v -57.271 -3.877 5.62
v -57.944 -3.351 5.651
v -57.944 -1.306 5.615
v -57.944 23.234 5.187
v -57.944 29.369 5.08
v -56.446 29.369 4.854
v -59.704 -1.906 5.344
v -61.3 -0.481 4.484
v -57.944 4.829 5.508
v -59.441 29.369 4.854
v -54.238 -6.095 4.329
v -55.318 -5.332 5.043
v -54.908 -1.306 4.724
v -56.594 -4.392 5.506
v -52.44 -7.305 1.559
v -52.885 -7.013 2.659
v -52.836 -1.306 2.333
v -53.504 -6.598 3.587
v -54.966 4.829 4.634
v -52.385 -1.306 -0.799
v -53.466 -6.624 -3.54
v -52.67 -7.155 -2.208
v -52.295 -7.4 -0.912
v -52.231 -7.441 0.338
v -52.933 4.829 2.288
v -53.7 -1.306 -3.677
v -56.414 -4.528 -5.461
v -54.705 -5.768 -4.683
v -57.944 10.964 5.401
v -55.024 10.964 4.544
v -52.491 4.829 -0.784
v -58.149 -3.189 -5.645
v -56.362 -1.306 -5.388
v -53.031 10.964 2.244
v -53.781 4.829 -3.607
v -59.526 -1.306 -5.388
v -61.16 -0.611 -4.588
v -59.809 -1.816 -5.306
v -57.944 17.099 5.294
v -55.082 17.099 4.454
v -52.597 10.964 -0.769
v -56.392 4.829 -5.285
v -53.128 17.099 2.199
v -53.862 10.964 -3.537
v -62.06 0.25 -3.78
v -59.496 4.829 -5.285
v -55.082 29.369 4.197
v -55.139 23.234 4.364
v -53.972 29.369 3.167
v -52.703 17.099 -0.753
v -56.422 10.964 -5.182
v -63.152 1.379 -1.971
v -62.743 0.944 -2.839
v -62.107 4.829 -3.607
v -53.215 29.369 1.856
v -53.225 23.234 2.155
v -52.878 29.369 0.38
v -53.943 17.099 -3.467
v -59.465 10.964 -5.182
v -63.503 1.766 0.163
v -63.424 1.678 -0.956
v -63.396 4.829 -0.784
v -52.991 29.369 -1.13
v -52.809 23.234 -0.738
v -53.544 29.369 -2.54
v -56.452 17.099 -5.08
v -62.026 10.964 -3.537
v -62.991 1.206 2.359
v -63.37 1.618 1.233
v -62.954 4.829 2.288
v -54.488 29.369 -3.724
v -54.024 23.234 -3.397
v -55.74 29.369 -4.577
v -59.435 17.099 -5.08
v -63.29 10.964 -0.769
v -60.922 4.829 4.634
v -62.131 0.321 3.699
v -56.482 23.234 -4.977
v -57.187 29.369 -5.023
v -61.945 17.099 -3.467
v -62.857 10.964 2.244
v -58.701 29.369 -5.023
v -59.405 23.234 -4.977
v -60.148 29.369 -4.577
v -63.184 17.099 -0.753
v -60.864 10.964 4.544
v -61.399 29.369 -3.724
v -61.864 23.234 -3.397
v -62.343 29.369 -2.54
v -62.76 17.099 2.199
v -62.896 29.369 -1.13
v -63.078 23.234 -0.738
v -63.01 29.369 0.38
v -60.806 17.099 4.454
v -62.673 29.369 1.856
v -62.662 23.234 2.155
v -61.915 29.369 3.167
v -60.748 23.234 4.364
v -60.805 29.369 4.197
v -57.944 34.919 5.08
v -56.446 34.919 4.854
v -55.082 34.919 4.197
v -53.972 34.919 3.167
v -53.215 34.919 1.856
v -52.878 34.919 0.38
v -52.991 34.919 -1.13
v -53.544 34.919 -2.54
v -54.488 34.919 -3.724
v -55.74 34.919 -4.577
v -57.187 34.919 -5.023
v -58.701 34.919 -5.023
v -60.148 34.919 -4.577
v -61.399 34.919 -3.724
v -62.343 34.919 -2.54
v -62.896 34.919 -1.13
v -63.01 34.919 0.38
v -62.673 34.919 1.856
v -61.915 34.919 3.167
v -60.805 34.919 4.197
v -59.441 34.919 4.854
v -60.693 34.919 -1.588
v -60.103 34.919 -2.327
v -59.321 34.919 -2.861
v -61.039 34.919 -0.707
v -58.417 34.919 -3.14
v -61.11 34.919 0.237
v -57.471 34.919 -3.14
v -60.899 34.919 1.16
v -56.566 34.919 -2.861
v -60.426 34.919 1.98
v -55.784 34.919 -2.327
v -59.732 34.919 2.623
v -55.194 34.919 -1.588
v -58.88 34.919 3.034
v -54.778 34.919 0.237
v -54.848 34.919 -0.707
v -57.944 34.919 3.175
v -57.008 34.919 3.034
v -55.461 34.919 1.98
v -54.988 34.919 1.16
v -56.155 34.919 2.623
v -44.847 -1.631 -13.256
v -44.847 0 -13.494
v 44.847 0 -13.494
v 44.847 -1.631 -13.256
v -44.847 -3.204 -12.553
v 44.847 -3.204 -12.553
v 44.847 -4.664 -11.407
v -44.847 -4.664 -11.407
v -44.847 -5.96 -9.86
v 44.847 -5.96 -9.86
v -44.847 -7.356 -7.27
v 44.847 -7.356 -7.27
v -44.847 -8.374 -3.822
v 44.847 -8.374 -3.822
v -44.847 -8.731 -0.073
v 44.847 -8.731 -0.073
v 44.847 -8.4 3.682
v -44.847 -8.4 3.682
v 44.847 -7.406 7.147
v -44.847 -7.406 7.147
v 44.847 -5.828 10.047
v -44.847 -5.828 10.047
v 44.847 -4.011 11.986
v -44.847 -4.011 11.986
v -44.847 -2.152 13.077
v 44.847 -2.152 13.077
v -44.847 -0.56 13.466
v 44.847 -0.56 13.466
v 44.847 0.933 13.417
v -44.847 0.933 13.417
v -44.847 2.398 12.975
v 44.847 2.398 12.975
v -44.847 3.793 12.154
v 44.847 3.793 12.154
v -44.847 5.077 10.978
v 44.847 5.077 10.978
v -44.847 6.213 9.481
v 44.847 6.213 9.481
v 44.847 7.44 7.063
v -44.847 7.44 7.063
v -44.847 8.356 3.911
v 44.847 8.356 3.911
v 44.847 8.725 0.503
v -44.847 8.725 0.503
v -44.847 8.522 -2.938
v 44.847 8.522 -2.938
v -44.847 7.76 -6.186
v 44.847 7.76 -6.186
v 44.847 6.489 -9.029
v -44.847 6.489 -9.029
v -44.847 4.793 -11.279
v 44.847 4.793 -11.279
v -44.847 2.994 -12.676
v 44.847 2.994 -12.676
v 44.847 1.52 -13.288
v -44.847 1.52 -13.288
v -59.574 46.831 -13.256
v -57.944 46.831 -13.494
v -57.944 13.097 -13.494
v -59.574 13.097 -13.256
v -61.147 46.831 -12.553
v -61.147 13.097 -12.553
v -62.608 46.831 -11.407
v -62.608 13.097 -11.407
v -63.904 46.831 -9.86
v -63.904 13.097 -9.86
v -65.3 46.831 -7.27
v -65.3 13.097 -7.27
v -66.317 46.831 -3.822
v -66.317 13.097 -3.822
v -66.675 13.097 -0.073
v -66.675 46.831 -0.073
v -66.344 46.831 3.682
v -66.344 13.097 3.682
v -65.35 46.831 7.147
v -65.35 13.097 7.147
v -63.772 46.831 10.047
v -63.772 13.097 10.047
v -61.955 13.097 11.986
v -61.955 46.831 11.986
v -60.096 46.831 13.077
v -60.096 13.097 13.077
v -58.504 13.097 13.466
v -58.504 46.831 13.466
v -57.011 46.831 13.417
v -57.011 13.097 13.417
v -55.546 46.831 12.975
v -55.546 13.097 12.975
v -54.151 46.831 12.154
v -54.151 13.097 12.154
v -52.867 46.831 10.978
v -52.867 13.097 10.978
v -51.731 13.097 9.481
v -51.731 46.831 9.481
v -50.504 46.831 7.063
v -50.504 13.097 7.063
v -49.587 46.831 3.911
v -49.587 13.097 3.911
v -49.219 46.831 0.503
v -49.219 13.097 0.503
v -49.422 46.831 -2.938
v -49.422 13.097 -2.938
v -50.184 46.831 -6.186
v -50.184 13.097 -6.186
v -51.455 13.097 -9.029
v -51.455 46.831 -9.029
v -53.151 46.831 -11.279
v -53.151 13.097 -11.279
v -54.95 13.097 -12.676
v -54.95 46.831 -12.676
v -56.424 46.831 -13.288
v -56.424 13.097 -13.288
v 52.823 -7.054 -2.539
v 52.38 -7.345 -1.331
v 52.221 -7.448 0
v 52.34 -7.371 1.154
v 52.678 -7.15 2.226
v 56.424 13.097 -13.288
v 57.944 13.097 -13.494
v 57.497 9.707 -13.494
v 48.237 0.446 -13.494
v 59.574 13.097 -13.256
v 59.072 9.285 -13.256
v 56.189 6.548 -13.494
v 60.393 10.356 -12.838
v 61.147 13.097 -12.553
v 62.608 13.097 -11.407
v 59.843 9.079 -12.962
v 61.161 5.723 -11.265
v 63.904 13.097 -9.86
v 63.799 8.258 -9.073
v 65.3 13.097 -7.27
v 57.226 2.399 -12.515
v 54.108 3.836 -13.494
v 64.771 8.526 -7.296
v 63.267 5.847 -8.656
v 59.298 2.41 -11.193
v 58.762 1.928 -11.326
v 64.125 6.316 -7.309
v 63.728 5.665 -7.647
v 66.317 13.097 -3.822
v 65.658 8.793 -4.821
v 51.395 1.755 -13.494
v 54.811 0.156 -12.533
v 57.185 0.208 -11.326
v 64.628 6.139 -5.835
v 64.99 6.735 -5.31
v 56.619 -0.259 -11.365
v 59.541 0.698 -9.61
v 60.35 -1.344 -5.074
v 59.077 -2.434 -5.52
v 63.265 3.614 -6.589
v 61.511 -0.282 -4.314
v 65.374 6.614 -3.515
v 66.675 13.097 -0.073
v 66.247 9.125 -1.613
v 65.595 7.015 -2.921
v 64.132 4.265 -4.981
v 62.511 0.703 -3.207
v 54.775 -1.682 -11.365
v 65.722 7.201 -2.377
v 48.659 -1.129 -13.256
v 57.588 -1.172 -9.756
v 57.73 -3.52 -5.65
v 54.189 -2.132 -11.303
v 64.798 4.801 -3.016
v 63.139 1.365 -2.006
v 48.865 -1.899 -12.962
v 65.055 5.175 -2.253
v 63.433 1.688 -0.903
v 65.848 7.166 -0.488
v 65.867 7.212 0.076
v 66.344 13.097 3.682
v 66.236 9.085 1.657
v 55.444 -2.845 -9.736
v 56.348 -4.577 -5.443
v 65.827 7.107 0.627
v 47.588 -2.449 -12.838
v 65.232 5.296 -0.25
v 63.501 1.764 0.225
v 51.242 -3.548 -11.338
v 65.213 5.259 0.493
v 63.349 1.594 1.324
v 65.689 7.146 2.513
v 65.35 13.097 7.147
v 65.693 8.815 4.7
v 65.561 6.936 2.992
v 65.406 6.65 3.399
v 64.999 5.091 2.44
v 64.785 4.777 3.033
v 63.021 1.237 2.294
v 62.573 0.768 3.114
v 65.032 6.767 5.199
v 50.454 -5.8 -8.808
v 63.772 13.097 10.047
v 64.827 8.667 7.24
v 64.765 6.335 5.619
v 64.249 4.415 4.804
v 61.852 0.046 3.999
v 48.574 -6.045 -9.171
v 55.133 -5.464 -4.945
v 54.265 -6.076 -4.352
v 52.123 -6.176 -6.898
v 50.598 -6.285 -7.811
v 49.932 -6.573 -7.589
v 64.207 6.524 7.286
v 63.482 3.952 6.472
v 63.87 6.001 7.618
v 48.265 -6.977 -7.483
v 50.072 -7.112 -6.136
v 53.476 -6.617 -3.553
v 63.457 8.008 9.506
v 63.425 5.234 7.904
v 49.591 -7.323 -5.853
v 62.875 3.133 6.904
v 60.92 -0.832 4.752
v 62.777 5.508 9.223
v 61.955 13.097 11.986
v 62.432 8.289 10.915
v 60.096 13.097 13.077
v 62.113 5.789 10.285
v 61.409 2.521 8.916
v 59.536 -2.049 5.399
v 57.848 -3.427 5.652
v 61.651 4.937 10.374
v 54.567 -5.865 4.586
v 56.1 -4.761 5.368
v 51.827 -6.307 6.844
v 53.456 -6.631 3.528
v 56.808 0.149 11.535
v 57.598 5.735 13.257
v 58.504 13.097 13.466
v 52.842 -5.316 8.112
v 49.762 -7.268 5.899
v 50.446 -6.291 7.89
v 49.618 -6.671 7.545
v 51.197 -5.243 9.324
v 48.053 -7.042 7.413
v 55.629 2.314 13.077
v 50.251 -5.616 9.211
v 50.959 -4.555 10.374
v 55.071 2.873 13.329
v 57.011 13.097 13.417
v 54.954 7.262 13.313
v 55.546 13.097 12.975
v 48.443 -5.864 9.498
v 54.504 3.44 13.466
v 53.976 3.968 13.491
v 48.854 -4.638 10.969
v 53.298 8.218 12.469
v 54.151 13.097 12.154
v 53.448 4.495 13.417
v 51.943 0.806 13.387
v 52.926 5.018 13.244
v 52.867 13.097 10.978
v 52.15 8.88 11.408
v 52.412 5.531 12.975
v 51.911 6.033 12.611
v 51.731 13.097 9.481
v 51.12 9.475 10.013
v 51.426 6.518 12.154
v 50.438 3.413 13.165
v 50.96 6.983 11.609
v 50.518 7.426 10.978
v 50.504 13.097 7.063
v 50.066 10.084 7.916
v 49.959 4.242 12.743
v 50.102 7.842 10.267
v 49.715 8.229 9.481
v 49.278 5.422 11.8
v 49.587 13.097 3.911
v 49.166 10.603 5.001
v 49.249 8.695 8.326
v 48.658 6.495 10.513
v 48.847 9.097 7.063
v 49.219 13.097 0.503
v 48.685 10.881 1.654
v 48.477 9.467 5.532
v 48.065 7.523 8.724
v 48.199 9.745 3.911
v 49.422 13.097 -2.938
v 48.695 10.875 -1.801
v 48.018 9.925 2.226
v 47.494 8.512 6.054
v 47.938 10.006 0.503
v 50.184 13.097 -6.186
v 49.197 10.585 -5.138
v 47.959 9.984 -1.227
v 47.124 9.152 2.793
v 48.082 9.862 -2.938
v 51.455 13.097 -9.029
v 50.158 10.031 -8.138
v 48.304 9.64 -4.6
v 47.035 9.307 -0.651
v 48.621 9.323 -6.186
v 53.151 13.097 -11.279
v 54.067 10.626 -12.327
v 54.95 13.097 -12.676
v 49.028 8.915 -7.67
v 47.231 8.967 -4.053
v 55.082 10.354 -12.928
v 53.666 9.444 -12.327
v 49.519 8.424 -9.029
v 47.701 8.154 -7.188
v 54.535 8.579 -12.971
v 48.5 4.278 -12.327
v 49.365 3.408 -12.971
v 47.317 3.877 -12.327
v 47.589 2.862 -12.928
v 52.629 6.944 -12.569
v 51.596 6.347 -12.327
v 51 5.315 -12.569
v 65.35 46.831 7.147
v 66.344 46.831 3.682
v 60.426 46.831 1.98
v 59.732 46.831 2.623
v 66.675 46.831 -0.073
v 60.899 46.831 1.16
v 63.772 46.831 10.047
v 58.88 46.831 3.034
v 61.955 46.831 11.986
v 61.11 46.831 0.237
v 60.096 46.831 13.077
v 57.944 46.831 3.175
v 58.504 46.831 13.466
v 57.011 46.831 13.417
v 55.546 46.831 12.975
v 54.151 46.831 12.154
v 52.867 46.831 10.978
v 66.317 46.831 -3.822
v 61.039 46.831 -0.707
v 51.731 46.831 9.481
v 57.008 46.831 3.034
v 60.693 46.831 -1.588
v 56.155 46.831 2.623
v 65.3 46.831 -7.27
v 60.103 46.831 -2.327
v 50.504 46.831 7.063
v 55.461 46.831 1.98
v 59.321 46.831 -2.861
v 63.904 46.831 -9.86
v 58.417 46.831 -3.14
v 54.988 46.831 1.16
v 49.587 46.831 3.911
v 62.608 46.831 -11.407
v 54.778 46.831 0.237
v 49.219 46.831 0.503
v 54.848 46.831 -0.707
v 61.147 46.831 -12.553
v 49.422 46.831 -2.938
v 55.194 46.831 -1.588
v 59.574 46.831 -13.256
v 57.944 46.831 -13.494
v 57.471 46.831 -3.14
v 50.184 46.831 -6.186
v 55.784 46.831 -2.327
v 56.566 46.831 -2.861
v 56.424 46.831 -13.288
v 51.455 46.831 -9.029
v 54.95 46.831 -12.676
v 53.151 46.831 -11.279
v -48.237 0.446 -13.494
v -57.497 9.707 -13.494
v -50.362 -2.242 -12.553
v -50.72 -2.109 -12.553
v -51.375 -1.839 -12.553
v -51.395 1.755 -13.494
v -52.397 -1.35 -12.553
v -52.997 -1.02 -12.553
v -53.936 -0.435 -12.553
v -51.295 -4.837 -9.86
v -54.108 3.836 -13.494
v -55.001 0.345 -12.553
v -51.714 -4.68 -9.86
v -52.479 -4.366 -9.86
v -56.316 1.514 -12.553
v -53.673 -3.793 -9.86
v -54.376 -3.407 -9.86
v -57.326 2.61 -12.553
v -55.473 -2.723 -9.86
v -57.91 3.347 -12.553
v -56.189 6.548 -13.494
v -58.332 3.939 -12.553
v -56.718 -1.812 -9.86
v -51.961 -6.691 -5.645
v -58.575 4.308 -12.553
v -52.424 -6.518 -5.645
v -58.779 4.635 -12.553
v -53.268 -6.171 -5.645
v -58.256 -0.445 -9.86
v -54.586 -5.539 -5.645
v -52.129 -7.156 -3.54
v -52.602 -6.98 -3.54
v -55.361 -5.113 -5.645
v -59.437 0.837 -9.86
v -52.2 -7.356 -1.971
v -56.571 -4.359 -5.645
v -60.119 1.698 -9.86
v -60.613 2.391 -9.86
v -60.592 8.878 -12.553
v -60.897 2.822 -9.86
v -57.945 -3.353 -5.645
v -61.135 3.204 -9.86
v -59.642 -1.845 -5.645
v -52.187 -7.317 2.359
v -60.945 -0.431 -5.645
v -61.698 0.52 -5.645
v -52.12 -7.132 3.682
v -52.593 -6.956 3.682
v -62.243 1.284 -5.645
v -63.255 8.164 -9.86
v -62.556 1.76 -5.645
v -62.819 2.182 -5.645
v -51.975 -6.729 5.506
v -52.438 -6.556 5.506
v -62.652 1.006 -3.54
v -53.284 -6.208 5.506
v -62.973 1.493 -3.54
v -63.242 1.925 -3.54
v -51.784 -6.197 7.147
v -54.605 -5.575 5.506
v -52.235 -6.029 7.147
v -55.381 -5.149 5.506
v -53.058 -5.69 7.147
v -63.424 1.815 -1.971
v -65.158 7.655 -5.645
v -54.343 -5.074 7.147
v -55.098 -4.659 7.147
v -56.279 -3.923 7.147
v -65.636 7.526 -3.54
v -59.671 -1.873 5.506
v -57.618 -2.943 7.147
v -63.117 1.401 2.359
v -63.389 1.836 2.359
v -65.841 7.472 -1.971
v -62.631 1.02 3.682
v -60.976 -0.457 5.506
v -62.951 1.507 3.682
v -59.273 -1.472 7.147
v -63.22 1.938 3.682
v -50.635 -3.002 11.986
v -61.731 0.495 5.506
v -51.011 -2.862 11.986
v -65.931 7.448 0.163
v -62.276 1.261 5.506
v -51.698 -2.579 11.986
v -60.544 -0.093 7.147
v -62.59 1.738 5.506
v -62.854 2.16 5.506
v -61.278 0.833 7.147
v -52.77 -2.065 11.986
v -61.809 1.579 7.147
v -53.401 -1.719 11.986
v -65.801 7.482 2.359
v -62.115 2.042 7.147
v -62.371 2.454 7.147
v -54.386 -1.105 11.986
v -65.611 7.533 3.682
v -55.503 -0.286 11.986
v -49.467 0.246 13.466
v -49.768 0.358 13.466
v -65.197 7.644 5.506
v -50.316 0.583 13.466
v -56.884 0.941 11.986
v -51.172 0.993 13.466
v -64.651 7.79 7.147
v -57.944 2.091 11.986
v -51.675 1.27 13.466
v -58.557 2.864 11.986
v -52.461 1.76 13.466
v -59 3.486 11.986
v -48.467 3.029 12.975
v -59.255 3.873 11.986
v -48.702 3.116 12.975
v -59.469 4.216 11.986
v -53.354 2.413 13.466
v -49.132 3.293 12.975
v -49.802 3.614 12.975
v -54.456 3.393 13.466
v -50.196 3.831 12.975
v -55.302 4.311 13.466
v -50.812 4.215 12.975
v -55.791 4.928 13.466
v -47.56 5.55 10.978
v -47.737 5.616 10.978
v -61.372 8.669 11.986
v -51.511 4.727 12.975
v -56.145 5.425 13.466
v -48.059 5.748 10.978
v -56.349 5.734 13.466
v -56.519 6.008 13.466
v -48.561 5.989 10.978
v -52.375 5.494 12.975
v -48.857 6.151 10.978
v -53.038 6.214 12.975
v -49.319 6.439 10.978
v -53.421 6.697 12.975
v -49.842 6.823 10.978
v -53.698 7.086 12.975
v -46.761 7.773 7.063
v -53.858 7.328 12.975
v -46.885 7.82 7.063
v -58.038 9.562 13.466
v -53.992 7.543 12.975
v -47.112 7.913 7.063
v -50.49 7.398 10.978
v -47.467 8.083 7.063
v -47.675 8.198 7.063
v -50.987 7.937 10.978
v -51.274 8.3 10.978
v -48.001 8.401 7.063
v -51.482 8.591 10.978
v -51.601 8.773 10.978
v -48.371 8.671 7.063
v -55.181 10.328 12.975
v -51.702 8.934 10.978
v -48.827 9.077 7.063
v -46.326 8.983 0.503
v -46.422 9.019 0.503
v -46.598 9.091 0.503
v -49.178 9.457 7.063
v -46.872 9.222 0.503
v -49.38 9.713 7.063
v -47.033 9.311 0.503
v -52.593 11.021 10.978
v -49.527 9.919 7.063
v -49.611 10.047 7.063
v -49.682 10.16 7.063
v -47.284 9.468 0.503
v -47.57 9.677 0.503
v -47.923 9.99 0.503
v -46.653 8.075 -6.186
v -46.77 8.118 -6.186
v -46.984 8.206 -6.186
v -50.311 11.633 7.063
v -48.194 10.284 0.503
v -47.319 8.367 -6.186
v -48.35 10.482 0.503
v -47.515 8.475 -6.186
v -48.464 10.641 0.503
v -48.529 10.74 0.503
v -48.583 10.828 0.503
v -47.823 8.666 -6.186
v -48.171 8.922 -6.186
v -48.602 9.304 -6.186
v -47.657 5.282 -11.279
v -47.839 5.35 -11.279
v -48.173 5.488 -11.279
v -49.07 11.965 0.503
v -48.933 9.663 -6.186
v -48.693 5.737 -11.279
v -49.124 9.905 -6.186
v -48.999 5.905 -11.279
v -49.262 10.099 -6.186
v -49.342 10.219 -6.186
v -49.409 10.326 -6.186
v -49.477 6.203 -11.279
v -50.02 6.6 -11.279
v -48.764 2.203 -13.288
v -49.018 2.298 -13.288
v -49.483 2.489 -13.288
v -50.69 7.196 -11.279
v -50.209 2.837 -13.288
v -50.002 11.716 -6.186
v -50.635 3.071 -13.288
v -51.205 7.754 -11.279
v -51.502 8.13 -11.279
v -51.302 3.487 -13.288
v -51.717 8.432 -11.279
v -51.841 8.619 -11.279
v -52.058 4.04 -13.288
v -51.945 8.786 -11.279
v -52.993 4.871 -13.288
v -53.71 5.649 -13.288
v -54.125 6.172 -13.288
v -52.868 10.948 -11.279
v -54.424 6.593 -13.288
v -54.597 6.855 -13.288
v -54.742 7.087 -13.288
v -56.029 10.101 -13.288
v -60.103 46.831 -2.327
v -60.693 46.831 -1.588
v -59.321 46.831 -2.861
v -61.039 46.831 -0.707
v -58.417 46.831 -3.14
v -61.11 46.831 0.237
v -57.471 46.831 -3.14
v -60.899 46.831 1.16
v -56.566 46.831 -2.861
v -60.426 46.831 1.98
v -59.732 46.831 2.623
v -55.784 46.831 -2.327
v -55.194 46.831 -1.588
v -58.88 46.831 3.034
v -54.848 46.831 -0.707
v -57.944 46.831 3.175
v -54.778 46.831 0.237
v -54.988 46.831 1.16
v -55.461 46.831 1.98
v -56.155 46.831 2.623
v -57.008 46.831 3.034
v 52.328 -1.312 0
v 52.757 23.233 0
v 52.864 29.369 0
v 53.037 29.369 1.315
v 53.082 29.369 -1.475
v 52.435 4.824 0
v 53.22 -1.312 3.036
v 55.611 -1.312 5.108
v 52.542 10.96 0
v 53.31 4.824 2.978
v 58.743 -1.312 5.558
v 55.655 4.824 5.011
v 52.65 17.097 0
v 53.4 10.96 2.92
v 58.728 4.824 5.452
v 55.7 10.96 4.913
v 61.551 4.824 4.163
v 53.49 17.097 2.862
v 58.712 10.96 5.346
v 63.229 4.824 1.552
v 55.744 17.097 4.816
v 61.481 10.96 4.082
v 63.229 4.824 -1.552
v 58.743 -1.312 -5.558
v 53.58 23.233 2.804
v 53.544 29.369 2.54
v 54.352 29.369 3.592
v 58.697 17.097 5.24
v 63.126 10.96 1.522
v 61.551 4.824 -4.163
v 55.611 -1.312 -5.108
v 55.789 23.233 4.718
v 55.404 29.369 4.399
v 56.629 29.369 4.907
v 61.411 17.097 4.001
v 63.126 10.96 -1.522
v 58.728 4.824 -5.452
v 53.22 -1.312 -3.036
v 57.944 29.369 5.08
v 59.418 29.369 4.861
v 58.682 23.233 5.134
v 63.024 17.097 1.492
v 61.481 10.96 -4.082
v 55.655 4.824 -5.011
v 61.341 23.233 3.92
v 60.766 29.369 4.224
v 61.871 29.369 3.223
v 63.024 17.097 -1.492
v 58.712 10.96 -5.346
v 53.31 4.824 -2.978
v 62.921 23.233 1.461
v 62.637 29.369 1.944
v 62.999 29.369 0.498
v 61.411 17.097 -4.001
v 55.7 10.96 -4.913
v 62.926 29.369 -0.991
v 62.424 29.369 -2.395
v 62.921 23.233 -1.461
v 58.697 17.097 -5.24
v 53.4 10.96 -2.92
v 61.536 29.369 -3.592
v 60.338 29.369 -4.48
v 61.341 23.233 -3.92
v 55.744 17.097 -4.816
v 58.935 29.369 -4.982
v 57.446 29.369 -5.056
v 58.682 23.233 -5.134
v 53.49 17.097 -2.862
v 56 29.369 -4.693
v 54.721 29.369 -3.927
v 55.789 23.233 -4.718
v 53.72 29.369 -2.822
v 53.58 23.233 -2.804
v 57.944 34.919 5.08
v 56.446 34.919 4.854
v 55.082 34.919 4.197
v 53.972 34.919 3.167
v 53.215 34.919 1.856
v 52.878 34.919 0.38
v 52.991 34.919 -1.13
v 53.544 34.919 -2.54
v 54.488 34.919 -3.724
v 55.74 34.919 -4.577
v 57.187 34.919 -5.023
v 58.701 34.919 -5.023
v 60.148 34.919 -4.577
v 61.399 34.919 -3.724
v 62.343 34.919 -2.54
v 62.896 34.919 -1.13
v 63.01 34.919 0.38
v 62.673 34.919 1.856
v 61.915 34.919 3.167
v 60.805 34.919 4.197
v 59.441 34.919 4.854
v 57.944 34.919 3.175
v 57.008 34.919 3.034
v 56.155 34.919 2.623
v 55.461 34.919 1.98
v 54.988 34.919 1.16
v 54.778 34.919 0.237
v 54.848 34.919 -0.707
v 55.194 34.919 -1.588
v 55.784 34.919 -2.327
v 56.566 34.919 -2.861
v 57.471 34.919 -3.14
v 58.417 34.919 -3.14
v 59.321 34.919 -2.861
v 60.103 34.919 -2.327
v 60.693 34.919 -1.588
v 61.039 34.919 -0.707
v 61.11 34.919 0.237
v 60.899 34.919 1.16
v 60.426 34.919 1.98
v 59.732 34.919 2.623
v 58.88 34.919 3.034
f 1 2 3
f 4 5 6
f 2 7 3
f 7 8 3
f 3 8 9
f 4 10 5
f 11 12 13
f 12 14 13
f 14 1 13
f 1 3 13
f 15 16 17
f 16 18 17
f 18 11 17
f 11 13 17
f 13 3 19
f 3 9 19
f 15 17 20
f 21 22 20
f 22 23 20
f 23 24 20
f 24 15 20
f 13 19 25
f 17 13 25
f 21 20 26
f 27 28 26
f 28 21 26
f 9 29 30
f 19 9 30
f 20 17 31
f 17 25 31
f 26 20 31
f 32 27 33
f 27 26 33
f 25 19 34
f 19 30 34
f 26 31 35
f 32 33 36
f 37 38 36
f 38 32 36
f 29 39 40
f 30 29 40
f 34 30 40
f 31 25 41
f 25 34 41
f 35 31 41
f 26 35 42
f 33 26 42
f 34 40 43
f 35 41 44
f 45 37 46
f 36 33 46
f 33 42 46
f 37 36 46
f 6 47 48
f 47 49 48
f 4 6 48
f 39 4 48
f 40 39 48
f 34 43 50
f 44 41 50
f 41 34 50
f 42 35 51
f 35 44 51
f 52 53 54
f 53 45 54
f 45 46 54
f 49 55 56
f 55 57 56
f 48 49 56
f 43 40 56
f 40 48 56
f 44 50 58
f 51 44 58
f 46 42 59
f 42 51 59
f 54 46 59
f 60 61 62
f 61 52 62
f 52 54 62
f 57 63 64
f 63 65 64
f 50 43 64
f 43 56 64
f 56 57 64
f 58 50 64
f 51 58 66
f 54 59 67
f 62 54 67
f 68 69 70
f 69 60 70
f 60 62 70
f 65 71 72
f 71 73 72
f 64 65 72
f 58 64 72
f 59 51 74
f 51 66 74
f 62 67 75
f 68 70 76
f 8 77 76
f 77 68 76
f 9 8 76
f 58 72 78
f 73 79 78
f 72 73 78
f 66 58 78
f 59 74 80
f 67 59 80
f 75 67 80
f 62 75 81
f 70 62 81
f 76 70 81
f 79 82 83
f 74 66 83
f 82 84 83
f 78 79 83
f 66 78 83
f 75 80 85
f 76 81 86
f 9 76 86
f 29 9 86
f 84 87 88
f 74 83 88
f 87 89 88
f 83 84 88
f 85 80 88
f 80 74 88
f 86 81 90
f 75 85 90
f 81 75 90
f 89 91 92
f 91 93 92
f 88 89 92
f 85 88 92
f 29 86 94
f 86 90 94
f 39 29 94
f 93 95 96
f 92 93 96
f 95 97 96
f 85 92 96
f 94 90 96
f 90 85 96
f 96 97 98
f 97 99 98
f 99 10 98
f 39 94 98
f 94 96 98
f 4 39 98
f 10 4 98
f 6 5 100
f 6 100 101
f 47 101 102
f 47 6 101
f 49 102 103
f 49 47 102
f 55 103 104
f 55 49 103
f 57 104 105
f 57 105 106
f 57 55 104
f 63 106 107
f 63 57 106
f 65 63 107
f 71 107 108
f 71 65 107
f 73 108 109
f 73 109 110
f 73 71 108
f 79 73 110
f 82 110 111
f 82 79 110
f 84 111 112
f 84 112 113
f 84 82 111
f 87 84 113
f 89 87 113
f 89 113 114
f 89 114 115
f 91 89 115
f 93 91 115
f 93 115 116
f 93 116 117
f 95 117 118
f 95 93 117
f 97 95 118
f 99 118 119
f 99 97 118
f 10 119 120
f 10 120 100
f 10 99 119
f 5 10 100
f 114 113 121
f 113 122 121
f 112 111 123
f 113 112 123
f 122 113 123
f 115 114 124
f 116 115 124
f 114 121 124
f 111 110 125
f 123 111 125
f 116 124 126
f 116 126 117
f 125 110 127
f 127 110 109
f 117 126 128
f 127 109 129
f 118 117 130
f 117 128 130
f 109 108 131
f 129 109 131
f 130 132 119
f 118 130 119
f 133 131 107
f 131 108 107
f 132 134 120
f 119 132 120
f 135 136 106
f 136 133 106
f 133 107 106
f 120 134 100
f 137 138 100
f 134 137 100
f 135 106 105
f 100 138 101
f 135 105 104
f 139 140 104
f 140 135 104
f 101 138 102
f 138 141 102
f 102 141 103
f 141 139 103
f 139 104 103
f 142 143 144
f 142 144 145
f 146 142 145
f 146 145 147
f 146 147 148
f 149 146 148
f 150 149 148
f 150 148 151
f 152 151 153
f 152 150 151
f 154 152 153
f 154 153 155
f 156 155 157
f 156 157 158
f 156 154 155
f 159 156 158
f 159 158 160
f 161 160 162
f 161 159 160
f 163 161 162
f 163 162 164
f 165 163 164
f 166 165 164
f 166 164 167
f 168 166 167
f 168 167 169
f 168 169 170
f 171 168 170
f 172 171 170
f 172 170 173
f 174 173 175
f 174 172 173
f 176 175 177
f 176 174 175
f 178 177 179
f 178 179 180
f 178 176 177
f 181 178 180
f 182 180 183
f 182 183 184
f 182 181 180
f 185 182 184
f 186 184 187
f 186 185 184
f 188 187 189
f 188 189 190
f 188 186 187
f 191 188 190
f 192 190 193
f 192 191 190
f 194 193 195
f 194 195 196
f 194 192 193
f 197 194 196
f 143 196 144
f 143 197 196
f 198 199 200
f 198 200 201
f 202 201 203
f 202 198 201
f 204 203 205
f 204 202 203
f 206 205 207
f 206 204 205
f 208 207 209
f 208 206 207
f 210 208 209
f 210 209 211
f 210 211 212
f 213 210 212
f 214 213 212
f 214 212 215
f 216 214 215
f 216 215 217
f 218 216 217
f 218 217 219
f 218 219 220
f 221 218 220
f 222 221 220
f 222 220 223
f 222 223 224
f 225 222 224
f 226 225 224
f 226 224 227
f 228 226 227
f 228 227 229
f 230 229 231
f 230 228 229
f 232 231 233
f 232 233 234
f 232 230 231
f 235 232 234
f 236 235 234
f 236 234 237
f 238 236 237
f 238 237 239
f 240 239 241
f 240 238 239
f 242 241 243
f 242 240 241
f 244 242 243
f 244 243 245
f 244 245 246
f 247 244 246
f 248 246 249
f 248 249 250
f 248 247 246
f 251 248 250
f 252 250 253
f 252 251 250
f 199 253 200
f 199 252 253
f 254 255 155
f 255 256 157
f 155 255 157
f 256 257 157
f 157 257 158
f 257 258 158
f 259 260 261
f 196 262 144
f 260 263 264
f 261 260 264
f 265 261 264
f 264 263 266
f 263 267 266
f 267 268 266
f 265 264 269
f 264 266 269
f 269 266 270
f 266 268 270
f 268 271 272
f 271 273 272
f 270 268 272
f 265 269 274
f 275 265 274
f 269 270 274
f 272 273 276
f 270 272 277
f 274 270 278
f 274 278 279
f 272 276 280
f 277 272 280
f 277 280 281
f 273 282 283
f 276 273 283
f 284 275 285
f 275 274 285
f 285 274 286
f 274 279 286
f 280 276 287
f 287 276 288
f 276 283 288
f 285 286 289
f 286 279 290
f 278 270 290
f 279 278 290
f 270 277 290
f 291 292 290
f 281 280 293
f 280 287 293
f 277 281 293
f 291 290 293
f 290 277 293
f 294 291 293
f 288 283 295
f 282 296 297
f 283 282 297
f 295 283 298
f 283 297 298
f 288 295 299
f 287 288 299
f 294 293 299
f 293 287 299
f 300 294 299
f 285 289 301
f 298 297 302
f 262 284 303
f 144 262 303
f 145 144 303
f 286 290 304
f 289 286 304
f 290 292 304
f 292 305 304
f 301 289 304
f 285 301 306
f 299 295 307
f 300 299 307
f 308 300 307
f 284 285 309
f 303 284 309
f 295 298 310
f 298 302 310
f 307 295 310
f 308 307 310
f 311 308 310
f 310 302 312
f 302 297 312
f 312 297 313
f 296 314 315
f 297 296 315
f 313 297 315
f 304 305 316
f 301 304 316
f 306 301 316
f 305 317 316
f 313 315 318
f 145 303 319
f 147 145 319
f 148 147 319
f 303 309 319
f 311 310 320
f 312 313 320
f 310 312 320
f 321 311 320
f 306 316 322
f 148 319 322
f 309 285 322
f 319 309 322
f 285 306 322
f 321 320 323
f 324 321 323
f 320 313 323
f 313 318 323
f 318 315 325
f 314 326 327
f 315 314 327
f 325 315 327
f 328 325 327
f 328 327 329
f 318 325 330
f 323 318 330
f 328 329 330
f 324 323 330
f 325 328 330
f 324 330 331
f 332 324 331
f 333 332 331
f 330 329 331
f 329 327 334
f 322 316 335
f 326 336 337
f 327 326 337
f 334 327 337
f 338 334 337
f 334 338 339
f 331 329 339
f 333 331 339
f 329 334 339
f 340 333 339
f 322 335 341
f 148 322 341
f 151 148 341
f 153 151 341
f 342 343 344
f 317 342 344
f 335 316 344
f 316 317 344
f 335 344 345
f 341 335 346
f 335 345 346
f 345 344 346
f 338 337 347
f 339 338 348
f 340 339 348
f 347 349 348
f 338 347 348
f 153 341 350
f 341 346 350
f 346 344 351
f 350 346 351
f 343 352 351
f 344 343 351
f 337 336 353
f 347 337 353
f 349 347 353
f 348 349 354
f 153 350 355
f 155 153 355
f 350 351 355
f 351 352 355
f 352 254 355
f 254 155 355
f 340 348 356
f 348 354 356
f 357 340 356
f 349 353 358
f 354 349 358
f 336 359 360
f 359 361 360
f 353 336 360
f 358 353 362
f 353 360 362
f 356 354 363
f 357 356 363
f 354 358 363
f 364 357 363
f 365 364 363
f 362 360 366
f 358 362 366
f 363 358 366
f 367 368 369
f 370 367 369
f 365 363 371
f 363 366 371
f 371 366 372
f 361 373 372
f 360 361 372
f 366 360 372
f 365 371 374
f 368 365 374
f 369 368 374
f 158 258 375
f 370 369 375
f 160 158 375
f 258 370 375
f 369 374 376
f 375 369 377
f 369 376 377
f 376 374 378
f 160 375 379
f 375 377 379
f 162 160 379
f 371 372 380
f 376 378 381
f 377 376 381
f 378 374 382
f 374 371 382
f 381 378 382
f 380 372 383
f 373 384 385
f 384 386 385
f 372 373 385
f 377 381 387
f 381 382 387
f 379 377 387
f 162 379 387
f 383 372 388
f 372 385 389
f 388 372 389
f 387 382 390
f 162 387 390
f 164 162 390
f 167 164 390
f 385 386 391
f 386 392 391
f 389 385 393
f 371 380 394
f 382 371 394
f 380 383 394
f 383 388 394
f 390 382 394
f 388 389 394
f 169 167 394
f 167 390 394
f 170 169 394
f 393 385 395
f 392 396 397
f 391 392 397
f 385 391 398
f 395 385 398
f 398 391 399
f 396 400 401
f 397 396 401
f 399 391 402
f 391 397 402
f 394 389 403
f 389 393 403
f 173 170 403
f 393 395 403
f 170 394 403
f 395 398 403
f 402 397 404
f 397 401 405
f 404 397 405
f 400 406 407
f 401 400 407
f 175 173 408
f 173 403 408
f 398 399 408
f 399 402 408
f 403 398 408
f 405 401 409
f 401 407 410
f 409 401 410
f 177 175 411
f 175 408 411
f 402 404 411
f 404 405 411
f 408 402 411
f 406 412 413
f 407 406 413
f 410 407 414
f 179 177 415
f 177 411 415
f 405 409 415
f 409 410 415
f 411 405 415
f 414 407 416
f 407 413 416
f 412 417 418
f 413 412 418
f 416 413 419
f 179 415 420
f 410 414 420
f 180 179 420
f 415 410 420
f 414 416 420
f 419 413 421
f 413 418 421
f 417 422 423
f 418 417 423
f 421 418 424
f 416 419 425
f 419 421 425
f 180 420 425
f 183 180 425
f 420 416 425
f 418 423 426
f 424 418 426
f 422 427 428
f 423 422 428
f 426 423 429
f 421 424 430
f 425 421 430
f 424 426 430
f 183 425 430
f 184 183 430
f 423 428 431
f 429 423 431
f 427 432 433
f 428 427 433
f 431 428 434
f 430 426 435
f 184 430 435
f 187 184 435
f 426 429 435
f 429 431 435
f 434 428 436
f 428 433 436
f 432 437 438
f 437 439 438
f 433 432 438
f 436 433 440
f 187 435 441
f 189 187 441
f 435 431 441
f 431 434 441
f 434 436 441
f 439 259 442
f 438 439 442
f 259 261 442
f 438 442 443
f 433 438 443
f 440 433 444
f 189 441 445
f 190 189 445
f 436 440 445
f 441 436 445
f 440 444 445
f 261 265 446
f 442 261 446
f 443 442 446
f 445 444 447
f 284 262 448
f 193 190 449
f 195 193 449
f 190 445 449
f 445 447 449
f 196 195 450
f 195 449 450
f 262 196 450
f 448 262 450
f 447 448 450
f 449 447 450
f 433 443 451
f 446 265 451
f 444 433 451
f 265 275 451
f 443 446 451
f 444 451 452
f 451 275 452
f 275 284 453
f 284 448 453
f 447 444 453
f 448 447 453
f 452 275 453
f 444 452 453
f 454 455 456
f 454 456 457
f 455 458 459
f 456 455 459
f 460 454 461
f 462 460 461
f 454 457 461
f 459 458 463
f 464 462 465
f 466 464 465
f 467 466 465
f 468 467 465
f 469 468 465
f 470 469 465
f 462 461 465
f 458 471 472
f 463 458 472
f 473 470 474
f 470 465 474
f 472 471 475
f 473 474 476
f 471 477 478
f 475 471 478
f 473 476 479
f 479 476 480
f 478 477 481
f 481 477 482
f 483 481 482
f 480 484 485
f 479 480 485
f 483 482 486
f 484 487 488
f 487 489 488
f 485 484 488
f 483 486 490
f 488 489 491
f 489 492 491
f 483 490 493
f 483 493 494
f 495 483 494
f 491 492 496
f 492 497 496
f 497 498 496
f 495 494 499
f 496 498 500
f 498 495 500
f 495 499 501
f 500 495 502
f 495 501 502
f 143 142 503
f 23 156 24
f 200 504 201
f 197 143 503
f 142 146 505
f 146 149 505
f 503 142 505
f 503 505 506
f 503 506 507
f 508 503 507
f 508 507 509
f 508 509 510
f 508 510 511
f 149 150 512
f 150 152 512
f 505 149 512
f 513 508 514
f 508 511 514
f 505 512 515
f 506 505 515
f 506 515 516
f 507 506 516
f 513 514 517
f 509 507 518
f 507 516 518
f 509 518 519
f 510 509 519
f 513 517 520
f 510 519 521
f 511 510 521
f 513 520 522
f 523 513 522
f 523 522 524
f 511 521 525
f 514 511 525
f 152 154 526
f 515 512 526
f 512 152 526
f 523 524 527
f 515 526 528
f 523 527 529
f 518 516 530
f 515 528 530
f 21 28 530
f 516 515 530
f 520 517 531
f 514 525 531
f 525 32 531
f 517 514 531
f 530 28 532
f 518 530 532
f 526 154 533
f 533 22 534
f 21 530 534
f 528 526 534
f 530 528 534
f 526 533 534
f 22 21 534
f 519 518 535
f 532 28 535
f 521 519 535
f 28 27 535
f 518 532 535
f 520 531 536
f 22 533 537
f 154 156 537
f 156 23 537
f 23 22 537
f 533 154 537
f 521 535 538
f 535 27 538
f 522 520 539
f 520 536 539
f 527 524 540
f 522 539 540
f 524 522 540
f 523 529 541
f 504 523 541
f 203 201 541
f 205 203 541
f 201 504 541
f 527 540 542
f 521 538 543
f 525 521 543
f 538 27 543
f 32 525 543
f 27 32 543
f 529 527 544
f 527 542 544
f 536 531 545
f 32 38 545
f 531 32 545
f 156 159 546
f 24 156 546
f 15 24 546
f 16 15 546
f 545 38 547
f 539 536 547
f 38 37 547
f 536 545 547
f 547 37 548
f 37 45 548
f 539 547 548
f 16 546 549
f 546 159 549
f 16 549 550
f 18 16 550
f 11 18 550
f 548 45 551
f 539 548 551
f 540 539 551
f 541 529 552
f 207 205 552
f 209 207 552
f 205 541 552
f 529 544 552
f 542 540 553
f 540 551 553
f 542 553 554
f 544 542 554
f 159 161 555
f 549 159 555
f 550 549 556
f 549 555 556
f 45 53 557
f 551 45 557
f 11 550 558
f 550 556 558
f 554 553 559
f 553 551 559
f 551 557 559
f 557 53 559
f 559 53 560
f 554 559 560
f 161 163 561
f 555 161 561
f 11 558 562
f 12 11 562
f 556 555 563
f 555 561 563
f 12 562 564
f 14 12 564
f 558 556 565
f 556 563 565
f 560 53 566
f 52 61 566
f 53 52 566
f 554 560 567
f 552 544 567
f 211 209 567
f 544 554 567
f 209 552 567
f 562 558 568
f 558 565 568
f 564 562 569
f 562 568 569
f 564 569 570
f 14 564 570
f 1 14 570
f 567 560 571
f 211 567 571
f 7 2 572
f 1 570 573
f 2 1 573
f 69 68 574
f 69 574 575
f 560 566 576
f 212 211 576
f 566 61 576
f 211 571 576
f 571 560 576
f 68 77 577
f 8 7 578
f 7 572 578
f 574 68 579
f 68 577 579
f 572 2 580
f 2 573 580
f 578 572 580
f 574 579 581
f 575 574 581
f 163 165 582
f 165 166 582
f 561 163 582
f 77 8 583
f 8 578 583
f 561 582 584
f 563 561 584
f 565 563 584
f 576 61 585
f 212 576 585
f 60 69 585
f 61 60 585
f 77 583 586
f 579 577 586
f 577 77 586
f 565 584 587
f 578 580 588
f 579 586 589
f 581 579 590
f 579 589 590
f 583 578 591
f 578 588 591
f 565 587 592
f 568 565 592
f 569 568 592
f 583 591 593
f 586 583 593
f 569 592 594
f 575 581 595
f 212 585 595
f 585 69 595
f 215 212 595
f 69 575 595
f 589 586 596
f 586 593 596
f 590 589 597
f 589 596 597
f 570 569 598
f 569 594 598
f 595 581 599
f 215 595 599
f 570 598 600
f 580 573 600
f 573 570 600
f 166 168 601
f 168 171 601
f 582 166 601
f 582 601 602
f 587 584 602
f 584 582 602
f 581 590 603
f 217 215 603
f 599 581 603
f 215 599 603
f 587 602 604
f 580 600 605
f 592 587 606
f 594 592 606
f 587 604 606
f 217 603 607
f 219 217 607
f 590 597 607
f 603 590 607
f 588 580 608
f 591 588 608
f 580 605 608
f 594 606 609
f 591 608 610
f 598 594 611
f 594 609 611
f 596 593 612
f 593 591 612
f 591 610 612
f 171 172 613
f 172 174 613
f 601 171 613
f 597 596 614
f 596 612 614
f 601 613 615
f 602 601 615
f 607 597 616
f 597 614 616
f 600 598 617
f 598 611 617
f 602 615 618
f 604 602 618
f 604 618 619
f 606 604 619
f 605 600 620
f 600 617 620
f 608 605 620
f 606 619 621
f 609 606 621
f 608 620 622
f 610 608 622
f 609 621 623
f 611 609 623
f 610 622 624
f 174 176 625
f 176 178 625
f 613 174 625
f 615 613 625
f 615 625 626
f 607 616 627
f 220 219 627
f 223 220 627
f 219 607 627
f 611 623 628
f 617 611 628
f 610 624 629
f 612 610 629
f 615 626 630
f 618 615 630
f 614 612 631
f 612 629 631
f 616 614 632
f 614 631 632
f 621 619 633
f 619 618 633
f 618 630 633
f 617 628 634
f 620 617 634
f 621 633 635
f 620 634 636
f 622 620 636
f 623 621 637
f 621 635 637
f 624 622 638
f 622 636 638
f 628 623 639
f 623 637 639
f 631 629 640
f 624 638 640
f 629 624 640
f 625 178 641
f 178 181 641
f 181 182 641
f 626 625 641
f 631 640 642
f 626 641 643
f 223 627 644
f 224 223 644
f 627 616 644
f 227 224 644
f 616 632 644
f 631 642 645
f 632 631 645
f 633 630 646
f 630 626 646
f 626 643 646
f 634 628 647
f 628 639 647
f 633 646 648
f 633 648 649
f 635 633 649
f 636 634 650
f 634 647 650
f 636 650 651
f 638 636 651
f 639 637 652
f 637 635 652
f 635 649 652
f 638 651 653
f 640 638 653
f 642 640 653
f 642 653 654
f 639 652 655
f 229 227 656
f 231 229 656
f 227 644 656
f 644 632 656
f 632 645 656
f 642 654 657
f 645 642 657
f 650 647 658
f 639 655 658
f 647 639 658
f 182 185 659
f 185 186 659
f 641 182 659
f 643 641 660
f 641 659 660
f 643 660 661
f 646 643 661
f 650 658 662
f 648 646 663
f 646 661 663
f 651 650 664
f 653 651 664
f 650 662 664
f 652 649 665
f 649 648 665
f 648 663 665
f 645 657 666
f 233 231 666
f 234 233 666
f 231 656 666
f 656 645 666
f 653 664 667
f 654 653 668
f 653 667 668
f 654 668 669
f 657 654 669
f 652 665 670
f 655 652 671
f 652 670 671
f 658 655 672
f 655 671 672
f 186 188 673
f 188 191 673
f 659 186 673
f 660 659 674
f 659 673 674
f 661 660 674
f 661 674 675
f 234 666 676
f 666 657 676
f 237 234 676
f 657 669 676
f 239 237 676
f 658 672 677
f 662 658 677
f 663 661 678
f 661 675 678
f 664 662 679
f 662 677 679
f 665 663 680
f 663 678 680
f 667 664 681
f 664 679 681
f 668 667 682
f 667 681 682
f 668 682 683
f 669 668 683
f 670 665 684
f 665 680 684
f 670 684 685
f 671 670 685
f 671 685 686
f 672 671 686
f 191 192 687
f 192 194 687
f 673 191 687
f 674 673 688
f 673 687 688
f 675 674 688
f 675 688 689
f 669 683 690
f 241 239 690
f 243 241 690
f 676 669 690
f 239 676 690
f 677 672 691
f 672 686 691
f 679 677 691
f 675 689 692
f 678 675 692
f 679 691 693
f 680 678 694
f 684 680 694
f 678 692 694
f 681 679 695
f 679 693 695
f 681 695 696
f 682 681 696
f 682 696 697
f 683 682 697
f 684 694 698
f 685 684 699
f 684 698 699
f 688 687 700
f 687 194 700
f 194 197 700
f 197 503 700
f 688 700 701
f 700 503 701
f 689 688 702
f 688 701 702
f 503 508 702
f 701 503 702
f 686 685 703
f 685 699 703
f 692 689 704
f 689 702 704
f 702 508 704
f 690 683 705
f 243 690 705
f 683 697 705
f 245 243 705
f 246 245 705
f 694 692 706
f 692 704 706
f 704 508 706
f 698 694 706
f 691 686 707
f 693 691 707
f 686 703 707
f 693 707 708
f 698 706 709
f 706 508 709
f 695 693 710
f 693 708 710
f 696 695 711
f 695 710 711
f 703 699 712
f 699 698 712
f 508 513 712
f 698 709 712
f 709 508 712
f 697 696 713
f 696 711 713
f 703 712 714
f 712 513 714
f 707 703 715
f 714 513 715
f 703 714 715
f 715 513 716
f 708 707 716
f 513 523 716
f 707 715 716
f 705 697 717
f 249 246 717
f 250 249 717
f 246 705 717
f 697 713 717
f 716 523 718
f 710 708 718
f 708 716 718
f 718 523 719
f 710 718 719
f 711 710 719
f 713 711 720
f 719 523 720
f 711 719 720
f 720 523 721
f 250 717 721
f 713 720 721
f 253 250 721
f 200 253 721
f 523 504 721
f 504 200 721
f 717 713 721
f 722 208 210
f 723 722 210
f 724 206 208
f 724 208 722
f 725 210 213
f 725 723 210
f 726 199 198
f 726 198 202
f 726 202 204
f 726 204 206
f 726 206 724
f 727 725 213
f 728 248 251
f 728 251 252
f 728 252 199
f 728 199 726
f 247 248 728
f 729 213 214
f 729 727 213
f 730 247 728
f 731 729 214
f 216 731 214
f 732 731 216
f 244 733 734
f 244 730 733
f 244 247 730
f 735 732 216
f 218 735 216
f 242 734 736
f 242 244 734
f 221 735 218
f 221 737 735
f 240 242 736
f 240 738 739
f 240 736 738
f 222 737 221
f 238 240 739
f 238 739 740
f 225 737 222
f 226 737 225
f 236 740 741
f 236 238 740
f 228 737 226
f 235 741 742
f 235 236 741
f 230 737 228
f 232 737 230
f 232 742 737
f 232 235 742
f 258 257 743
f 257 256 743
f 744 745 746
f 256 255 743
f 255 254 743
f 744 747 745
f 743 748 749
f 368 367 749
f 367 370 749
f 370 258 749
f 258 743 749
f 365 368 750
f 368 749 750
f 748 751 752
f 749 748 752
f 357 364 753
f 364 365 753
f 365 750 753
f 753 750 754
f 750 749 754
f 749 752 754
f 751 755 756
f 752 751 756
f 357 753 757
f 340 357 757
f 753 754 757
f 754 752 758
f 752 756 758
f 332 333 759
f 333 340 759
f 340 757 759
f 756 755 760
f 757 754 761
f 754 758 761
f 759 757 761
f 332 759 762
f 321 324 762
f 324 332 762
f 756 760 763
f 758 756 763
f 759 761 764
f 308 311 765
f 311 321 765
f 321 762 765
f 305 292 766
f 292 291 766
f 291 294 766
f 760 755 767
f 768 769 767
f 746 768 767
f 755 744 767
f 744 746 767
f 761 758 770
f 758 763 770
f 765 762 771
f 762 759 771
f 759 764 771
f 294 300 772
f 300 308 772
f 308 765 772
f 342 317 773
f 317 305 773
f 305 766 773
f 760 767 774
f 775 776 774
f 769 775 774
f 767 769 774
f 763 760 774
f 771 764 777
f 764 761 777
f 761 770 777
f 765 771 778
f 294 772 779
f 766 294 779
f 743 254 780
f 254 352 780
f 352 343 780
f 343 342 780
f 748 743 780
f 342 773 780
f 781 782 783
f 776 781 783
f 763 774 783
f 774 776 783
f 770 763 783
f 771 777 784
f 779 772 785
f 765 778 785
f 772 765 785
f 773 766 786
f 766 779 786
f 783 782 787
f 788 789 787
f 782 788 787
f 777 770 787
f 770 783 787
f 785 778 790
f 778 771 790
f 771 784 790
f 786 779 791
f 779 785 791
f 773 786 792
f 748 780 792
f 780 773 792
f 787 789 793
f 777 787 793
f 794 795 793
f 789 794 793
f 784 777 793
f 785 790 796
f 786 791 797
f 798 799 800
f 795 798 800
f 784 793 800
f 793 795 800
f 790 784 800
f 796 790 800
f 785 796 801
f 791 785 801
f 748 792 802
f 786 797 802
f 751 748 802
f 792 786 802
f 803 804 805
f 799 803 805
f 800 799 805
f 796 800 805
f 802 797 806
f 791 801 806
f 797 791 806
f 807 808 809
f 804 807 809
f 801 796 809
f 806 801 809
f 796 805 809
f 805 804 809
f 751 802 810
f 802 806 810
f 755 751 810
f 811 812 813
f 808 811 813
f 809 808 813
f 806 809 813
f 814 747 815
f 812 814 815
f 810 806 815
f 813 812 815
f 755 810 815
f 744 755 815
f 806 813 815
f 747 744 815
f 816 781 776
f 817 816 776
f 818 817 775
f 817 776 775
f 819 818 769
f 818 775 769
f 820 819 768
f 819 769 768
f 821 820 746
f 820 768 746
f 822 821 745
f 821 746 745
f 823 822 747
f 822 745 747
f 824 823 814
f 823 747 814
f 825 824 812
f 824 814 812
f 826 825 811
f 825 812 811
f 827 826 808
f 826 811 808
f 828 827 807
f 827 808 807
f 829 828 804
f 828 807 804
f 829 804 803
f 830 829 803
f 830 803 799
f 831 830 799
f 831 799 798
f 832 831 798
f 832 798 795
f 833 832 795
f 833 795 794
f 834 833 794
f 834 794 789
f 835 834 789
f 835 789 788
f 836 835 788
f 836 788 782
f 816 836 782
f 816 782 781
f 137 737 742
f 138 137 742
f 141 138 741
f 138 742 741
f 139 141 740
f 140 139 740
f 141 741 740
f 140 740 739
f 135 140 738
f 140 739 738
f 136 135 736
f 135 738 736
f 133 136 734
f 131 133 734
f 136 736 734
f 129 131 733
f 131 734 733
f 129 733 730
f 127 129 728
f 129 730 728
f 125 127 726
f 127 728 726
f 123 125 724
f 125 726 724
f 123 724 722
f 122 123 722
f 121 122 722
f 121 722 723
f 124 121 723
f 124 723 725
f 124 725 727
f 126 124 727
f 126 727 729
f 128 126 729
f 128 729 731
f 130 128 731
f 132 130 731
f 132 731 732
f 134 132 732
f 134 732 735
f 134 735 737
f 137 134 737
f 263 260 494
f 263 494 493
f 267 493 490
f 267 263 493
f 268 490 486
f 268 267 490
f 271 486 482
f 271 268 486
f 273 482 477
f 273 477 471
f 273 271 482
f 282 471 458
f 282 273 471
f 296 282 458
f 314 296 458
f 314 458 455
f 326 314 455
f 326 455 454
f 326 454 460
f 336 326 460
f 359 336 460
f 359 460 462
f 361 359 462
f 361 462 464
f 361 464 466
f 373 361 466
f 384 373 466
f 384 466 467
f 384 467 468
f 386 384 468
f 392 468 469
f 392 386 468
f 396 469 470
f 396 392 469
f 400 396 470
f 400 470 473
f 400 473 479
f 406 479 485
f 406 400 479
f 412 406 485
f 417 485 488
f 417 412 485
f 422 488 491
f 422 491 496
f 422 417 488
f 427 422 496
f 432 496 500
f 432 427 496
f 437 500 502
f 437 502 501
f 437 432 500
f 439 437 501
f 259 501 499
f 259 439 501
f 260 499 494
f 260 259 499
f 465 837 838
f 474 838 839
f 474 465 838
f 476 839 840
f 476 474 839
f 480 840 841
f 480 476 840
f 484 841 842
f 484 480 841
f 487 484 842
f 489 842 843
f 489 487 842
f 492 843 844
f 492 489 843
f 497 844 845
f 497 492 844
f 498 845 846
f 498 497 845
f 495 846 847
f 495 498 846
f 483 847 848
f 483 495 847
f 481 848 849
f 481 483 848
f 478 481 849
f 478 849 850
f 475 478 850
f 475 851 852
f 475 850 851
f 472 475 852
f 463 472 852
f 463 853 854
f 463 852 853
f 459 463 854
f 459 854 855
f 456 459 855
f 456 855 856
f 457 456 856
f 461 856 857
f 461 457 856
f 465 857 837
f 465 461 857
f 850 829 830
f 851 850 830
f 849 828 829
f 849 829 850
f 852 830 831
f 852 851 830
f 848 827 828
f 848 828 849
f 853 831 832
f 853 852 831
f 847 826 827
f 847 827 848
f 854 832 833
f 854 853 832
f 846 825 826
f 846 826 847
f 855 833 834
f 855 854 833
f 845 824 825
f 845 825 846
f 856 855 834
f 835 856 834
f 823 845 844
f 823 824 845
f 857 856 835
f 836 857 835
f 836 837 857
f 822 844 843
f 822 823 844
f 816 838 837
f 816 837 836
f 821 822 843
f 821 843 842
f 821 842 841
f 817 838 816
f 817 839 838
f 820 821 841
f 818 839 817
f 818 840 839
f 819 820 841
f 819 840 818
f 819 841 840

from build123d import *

# Parameters (mm, degrees)
SKETCH2_RX               = 13.49375
SKETCH2_RY               = 8.73125
SKETCH4_R                = 3.175
EXTRUDE1_DEPTH           = 17.4625
SKETCH9_R                = 5.08
EXTRUDE2_DEPTH           = 5.5499
EXTRUDE2_OTHER_WAY_DEPTH = 78.969525699
EXTRUDE2_OTHER_WAY_DRAFT = 1
MIRROR1_COPY_1_SKETCH_R  = 5.08
MIRROR1_COPY_1_DEPTH     = 78.969525699
MIRROR1_COPY_1_DRAFT     = 1
MIRROR1_COPY_2_SKETCH_R  = 5.08
MIRROR1_COPY_2_DEPTH     = 78.969525699
MIRROR1_COPY_2_DRAFT     = 1


with BuildPart() as part:
    # Sweep1: sweep along a path in Sketch3
    with BuildLine(Plane.XY) as sweep1_path:
        Line((57.94375, 46.83125), (57.94375, 13.096875))
        ThreePointArc((57.94375, 13.096875), (54.107764125, 3.835985875), (44.846875, 0))
        Line((44.846875, 0), (-44.846875, 0))
        ThreePointArc((-44.846875, 0), (-54.107764125, 3.835985875), (-57.94375, 13.096875))
        Line((-57.94375, 13.096875), (-57.94375, 46.83125))
    # Sketch2 → Sweep1 (sweep)
    with BuildSketch(Plane(origin=(0, 46.83125, 0), x_dir=(-1, 0, 0), z_dir=(0, 1, 0))):
        with Locations(Location((57.94375, 0), (0, 0, -90))):
            Ellipse(SKETCH2_RX, SKETCH2_RY)
    sweep(path=sweep1_path.line)

    # Sketch4 → Extrude1 (cut)
    with BuildSketch(Plane(origin=(0, 46.83125, 0), x_dir=(-1, 0, 0), z_dir=(0, 1, 0))):
        with Locations(Location((57.94375, 0, 0), (0, 0, 90))):
            Circle(SKETCH4_R)
    extrude1 = extrude(amount=-EXTRUDE1_DEPTH, mode=Mode.SUBTRACT)

    # Sketch9 → Extrude2 (cut)
    with BuildSketch(Plane(origin=(0, 29.36875, 0), x_dir=(1, 0, 0), z_dir=(0, 1, 0))):
        with Locations(Location((-57.94375, 0, 0), (0, 0, 270))):
            Circle(SKETCH9_R)
    extrude2 = extrude(amount=EXTRUDE2_DEPTH, mode=Mode.SUBTRACT)


with BuildPart() as extrude2_other_way_tool:
    # Sketch9 → Extrude2 other way (with draft: the straight prism first)
    with BuildSketch(Plane(origin=(0, 29.36875, 0), x_dir=(1, 0, 0), z_dir=(0, 1, 0))):
        with Locations(Location((-57.94375, 0, 0), (0, 0, 270))):
            Circle(SKETCH9_R)
    extrude(amount=-EXTRUDE2_OTHER_WAY_DEPTH)
    # Extrude2 other way: the draft: its side faces are tilted about the plane it starts from
    extrude2_other_way_sides = [extrude2_other_way_tool.faces().sort_by_distance(p)[0] for p in [
        (-57.94375, -10.116012849, -5.08),
    ]]
    draft(extrude2_other_way_sides, Plane(origin=(0, 29.36875, 0), x_dir=(1, 0, 0), z_dir=(0, 1, 0)), EXTRUDE2_OTHER_WAY_DRAFT)


with BuildPart() as part_1:
    add(part.part)

    # Extrude2 other way: cut by extrude2_other_way_tool
    add(extrude2_other_way_tool.part, mode=Mode.SUBTRACT)

    # Mirror1: Extrude1, Extrude2 across plane
    add(extrude1.mirror(Plane(origin=(0, 0, 0), x_dir=(0, 0, 1), z_dir=(1, 0, 0))), mode=Mode.SUBTRACT)
    add(extrude2.mirror(Plane(origin=(0, 0, 0), x_dir=(0, 0, 1), z_dir=(1, 0, 0))), mode=Mode.SUBTRACT)


with BuildPart() as mirror1_copy_1_tool:
    # Mirror1 copy 1 sketch → Mirror1 copy 1 (with draft: the straight prism first)
    with BuildSketch(Plane(origin=(0, 29.36875, 0), x_dir=(-1, 0, 0), z_dir=(0, 1, 0))):
        with Locations((-57.94375, 0)):
            Circle(MIRROR1_COPY_1_SKETCH_R)
    extrude(amount=-MIRROR1_COPY_1_DEPTH)
    # Mirror1 copy 1: the draft: its side faces are tilted about the plane it starts from
    mirror1_copy_1_sides = [mirror1_copy_1_tool.faces().sort_by_distance(p)[0] for p in [
        (57.94375, -10.116012849, -5.08),
    ]]
    draft(mirror1_copy_1_sides, Plane(origin=(0, 29.36875, 0), x_dir=(-1, 0, 0), z_dir=(0, 1, 0)), MIRROR1_COPY_1_DRAFT)


with BuildPart() as part_2:
    add(part_1.part)

    # Mirror1 copy 1: cut by mirror1_copy_1_tool
    add(mirror1_copy_1_tool.part, mode=Mode.SUBTRACT)


with BuildPart() as mirror1_copy_2_tool:
    # Mirror1 copy 2 sketch → Mirror1 copy 2 (with draft: the straight prism first)
    with BuildSketch(Plane(origin=(0, 29.36875, 0), x_dir=(-1, 0, 0), z_dir=(0, 1, 0))):
        with Locations((-57.94375, 0)):
            Circle(MIRROR1_COPY_2_SKETCH_R)
    extrude(amount=-MIRROR1_COPY_2_DEPTH)
    # Mirror1 copy 2: the draft: its side faces are tilted about the plane it starts from
    mirror1_copy_2_sides = [mirror1_copy_2_tool.faces().sort_by_distance(p)[0] for p in [
        (57.94375, -10.116012849, -5.08),
    ]]
    draft(mirror1_copy_2_sides, Plane(origin=(0, 29.36875, 0), x_dir=(-1, 0, 0), z_dir=(0, 1, 0)), MIRROR1_COPY_2_DRAFT)


with BuildPart() as part_3:
    add(part_2.part)

    # Mirror1 copy 2: cut by mirror1_copy_2_tool
    add(mirror1_copy_2_tool.part, mode=Mode.SUBTRACT)


solid = part_3.part
